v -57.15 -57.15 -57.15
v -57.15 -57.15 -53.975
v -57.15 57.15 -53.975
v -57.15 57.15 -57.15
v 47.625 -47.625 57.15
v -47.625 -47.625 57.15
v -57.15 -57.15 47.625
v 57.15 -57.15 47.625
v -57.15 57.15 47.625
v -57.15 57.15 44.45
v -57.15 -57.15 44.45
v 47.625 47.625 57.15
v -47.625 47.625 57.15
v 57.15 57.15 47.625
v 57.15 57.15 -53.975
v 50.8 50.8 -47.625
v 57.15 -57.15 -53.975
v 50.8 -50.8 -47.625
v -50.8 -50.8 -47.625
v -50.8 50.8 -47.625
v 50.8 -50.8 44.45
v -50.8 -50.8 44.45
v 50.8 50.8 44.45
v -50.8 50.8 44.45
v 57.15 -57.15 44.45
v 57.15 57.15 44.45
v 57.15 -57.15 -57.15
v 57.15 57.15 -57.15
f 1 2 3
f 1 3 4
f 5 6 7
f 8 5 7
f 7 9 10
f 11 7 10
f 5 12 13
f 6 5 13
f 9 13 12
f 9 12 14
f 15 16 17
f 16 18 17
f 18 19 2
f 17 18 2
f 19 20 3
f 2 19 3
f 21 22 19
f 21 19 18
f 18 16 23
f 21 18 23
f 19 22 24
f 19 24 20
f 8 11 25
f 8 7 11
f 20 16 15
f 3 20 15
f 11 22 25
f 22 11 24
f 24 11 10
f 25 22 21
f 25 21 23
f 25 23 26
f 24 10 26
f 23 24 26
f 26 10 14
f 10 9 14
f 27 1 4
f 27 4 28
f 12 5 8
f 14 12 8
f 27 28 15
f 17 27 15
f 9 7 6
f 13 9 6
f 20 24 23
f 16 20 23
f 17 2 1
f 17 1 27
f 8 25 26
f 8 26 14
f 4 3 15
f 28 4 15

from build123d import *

# Parameters (mm, degrees)
F0_W          = 101.6
F0_H          = 6.35
F0_H_2        = 88.9
F1_DEPTH      = 50.8
F2_DEPTH      = 57.15
F3_DEPTH      = 57.15
F4_T1_DEPTH   = 163.2905609208
F4_T3_DEPTH   = 163.2905609208
F4_T8_DEPTH   = 163.2905609208
F4_T14_DEPTH  = 163.2905609208
F4_T20_DEPTH  = 163.2905609208
F4_T27_DEPTH  = 163.2905609208
F4_T33_DEPTH  = 163.2905609208
F4_T39_DEPTH  = 163.2905609208
F4_T45_DEPTH  = 163.2905609208
F4_T51_DEPTH  = 163.2905609208
F4_T58_DEPTH  = 163.2905609208
F4_T64_DEPTH  = 163.2905609208
F4_T70_DEPTH  = 163.2905609208
F4_T76_DEPTH  = 163.2905609208
F4_T82_DEPTH  = 163.2905609208
F4_T89_DEPTH  = 163.2905609208
F4_T95_DEPTH  = 163.2905609208
F4_T101_DEPTH = 163.2905609208
F4_T107_DEPTH = 163.2905609208
F4_T113_DEPTH = 163.2905609208
F4_T120_DEPTH = 163.2905609208
F4_T126_DEPTH = 163.2905609208


# Not quite as in the source:
# - a fillet or chamfer that OpenCascade refuses, or shapes differently, is made with other operations: its cross-section is extruded or revolved along the edge and cut away or added


with BuildPart() as f1:
    # F0 (on Front) → F1 (new body, symmetric)
    with BuildSketch(Plane.XZ):
        with Locations((0, -47.625)):
            Rectangle(F0_W, F0_H)
        Rectangle(F0_W, F0_H_2)
        with Locations((0, 47.625)):
            Rectangle(F0_W, F0_H)
    extrude(amount=F1_DEPTH, both=True)

    # F0 (on Front) → F2 (join, symmetric)
    with BuildSketch(Plane.XZ):
        Polygon((-50.8, 44.45), (-50.8, 50.8), (50.8, 50.8), (50.8, 44.45), (57.15, 44.45), (57.15, 57.15), (-57.15, 57.15), (-57.15, 44.45), align=None)
        Polygon((-50.8, -50.8), (-50.8, -44.45), (-57.15, -44.45), (-57.15, -57.15), (57.15, -57.15), (57.15, -44.45), (50.8, -44.45), (50.8, -50.8), align=None)
    extrude(amount=F2_DEPTH, both=True)

    # F0 (on Front) → F3 (join, symmetric)
    with BuildSketch(Plane.XZ):
        with Locations((0, 47.625)):
            Rectangle(F0_W, F0_H)
        with Locations((0, -47.625)):
            Rectangle(F0_W, F0_H)
    extrude(amount=F3_DEPTH, both=True)

    # F4: chamfer of 9.525 on 8 edges, made by hand

    # F4_s2 → F4_t1 (cut)
    with BuildSketch(Plane.YZ.offset(-81.6452804604)):
        Polygon((-47.625, 57.15), (-57.15, 47.625), (-57.15, 57.15), align=None)
        Polygon((47.625, 57.15), (57.15, 47.625), (57.15, 57.15), align=None)
    extrude(amount=F4_T1_DEPTH, mode=Mode.SUBTRACT)

    # F4_s4 → F4_t3 (cut)
    with BuildSketch(Plane.XZ.offset(-81.6452804604)):
        Polygon((47.625, 57.15), (57.15, 47.625), (57.15, 57.15), align=None)
        Polygon((-57.15, 47.625), (-47.625, 57.15), (-57.15, 57.15), align=None)
    extrude(amount=F4_T3_DEPTH, mode=Mode.SUBTRACT)


with BuildPart() as f4_tool6:
    # F4_s7 → F4_t8 (new body)
    with BuildSketch(Plane.XZ.offset(81.6452804604)):
        Polygon((47.625, -44.45), (57.15, -53.975), (57.15, -44.45), align=None)
    extrude(amount=-F4_T8_DEPTH)

    split(bisect_by=Plane.YZ.offset(50.8), keep=Keep.BOTTOM)

    split(bisect_by=Plane.XZ.offset(50.8), keep=Keep.TOP)


with BuildPart() as f1_1:
    add(f1.part)

    # F4_t5: cut F4_tool6
    add(f4_tool6.part, mode=Mode.SUBTRACT)


with BuildPart() as f4_tool12:
    # F4_s13 → F4_t14 (new body)
    with BuildSketch(Plane.XZ.offset(81.6452804604)):
        Polygon((47.625, -44.45), (57.15, -53.975), (57.15, -44.45), align=None)
    extrude(amount=-F4_T14_DEPTH)

    split(bisect_by=Plane.YZ.offset(50.8), keep=Keep.TOP)

    split(bisect_by=Plane.XZ.offset(50.8), keep=Keep.TOP)


with BuildPart() as f1_2:
    add(f1_1.part)

    # F4_t11: cut F4_tool12
    add(f4_tool12.part, mode=Mode.SUBTRACT)


with BuildPart() as f4_tool18:
    # F4_s19 → F4_t20 (new body)
    with BuildSketch(Plane.XZ.offset(81.6452804604)):
        Polygon((47.625, -44.45), (57.15, -53.975), (57.15, -44.45), align=None)
    extrude(amount=-F4_T20_DEPTH)

    split(bisect_by=Plane.XZ.offset(-50.8), keep=Keep.TOP)

    split(bisect_by=Plane.YZ.offset(50.8), keep=Keep.TOP)

    split(bisect_by=Plane.XZ.offset(50.8), keep=Keep.BOTTOM)


with BuildPart() as f1_3:
    add(f1_2.part)

    # F4_t17: cut F4_tool18
    add(f4_tool18.part, mode=Mode.SUBTRACT)


with BuildPart() as f4_tool25:
    # F4_s26 → F4_t27 (new body)
    with BuildSketch(Plane.XZ.offset(81.6452804604)):
        Polygon((47.625, -44.45), (57.15, -53.975), (57.15, -44.45), align=None)
    extrude(amount=-F4_T27_DEPTH)

    split(bisect_by=Plane.XZ.offset(-50.8), keep=Keep.BOTTOM)

    split(bisect_by=Plane.YZ.offset(50.8), keep=Keep.BOTTOM)


with BuildPart() as f1_4:
    add(f1_3.part)

    # F4_t24: cut F4_tool25
    add(f4_tool25.part, mode=Mode.SUBTRACT)


with BuildPart() as f4_tool31:
    # F4_s32 → F4_t33 (new body)
    with BuildSketch(Plane.XZ.offset(81.6452804604)):
        Polygon((47.625, -44.45), (57.15, -53.975), (57.15, -44.45), align=None)
    extrude(amount=-F4_T33_DEPTH)

    split(bisect_by=Plane.XZ.offset(-50.8), keep=Keep.BOTTOM)

    split(bisect_by=Plane.YZ.offset(50.8), keep=Keep.TOP)


with BuildPart() as f1_5:
    add(f1_4.part)

    # F4_t30: cut F4_tool31
    add(f4_tool31.part, mode=Mode.SUBTRACT)


with BuildPart() as f4_tool37:
    # F4_s38 → F4_t39 (new body)
    with BuildSketch(Plane.YZ.offset(-81.6452804604)):
        Polygon((-47.625, -44.45), (-57.15, -53.975), (-57.15, -44.45), align=None)
    extrude(amount=F4_T39_DEPTH)

    split(bisect_by=Plane.YZ.offset(-50.8), keep=Keep.BOTTOM)

    split(bisect_by=Plane.XZ.offset(50.8), keep=Keep.BOTTOM)


with BuildPart() as f1_6:
    add(f1_5.part)

    # F4_t36: cut F4_tool37
    add(f4_tool37.part, mode=Mode.SUBTRACT)


with BuildPart() as f4_tool43:
    # F4_s44 → F4_t45 (new body)
    with BuildSketch(Plane.YZ.offset(-81.6452804604)):
        Polygon((-47.625, -44.45), (-57.15, -53.975), (-57.15, -44.45), align=None)
    extrude(amount=F4_T45_DEPTH)

    split(bisect_by=Plane.YZ.offset(-50.8), keep=Keep.BOTTOM)

    split(bisect_by=Plane.XZ.offset(50.8), keep=Keep.TOP)


with BuildPart() as f1_7:
    add(f1_6.part)

    # F4_t42: cut F4_tool43
    add(f4_tool43.part, mode=Mode.SUBTRACT)


with BuildPart() as f4_tool49:
    # F4_s50 → F4_t51 (new body)
    with BuildSketch(Plane.YZ.offset(-81.6452804604)):
        Polygon((-47.625, -44.45), (-57.15, -53.975), (-57.15, -44.45), align=None)
    extrude(amount=F4_T51_DEPTH)

    split(bisect_by=Plane.YZ.offset(-50.8), keep=Keep.TOP)

    split(bisect_by=Plane.YZ.offset(50.8), keep=Keep.BOTTOM)

    split(bisect_by=Plane.XZ.offset(50.8), keep=Keep.TOP)


with BuildPart() as f1_8:
    add(f1_7.part)

    # F4_t48: cut F4_tool49
    add(f4_tool49.part, mode=Mode.SUBTRACT)


with BuildPart() as f4_tool56:
    # F4_s57 → F4_t58 (new body)
    with BuildSketch(Plane.YZ.offset(-81.6452804604)):
        Polygon((-47.625, -44.45), (-57.15, -53.975), (-57.15, -44.45), align=None)
    extrude(amount=F4_T58_DEPTH)

    split(bisect_by=Plane.YZ.offset(50.8), keep=Keep.TOP)

    split(bisect_by=Plane.XZ.offset(50.8), keep=Keep.BOTTOM)


with BuildPart() as f1_9:
    add(f1_8.part)

    # F4_t55: cut F4_tool56
    add(f4_tool56.part, mode=Mode.SUBTRACT)


with BuildPart() as f4_tool62:
    # F4_s63 → F4_t64 (new body)
    with BuildSketch(Plane.YZ.offset(-81.6452804604)):
        Polygon((-47.625, -44.45), (-57.15, -53.975), (-57.15, -44.45), align=None)
    extrude(amount=F4_T64_DEPTH)

    split(bisect_by=Plane.YZ.offset(50.8), keep=Keep.TOP)

    split(bisect_by=Plane.XZ.offset(50.8), keep=Keep.TOP)


with BuildPart() as f1_10:
    add(f1_9.part)

    # F4_t61: cut F4_tool62
    add(f4_tool62.part, mode=Mode.SUBTRACT)


with BuildPart() as f4_tool68:
    # F4_s69 → F4_t70 (new body)
    with BuildSketch(Plane.XZ.offset(-81.6452804604)):
        Polygon((-47.625, -44.45), (-57.15, -53.975), (-57.15, -44.45), align=None)
    extrude(amount=F4_T70_DEPTH)

    split(bisect_by=Plane.YZ.offset(-50.8), keep=Keep.TOP)

    split(bisect_by=Plane.XZ.offset(-50.8), keep=Keep.BOTTOM)


with BuildPart() as f1_11:
    add(f1_10.part)

    # F4_t67: cut F4_tool68
    add(f4_tool68.part, mode=Mode.SUBTRACT)


with BuildPart() as f4_tool74:
    # F4_s75 → F4_t76 (new body)
    with BuildSketch(Plane.XZ.offset(-81.6452804604)):
        Polygon((-47.625, -44.45), (-57.15, -53.975), (-57.15, -44.45), align=None)
    extrude(amount=F4_T76_DEPTH)

    split(bisect_by=Plane.YZ.offset(-50.8), keep=Keep.BOTTOM)

    split(bisect_by=Plane.XZ.offset(-50.8), keep=Keep.BOTTOM)


with BuildPart() as f1_12:
    add(f1_11.part)

    # F4_t73: cut F4_tool74
    add(f4_tool74.part, mode=Mode.SUBTRACT)


with BuildPart() as f4_tool80:
    # F4_s81 → F4_t82 (new body)
    with BuildSketch(Plane.XZ.offset(-81.6452804604)):
        Polygon((-47.625, -44.45), (-57.15, -53.975), (-57.15, -44.45), align=None)
    extrude(amount=F4_T82_DEPTH)

    split(bisect_by=Plane.YZ.offset(-50.8), keep=Keep.BOTTOM)

    split(bisect_by=Plane.XZ.offset(-50.8), keep=Keep.TOP)

    split(bisect_by=Plane.XZ.offset(50.8), keep=Keep.BOTTOM)


with BuildPart() as f1_13:
    add(f1_12.part)

    # F4_t79: cut F4_tool80
    add(f4_tool80.part, mode=Mode.SUBTRACT)


with BuildPart() as f4_tool87:
    # F4_s88 → F4_t89 (new body)
    with BuildSketch(Plane.XZ.offset(-81.6452804604)):
        Polygon((-47.625, -44.45), (-57.15, -53.975), (-57.15, -44.45), align=None)
    extrude(amount=F4_T89_DEPTH)

    split(bisect_by=Plane.YZ.offset(-50.8), keep=Keep.TOP)

    split(bisect_by=Plane.XZ.offset(50.8), keep=Keep.TOP)


with BuildPart() as f1_14:
    add(f1_13.part)

    # F4_t86: cut F4_tool87
    add(f4_tool87.part, mode=Mode.SUBTRACT)


with BuildPart() as f4_tool93:
    # F4_s94 → F4_t95 (new body)
    with BuildSketch(Plane.XZ.offset(-81.6452804604)):
        Polygon((-47.625, -44.45), (-57.15, -53.975), (-57.15, -44.45), align=None)
    extrude(amount=F4_T95_DEPTH)

    split(bisect_by=Plane.YZ.offset(-50.8), keep=Keep.BOTTOM)

    split(bisect_by=Plane.XZ.offset(50.8), keep=Keep.TOP)


with BuildPart() as f1_15:
    add(f1_14.part)

    # F4_t92: cut F4_tool93
    add(f4_tool93.part, mode=Mode.SUBTRACT)


with BuildPart() as f4_tool99:
    # F4_s100 → F4_t101 (new body)
    with BuildSketch(Plane.YZ.offset(81.6452804604)):
        Polygon((47.625, -44.45), (57.15, -53.975), (57.15, -44.45), align=None)
    extrude(amount=-F4_T101_DEPTH)

    split(bisect_by=Plane.XZ.offset(-50.8), keep=Keep.TOP)

    split(bisect_by=Plane.YZ.offset(50.8), keep=Keep.TOP)


with BuildPart() as f1_16:
    add(f1_15.part)

    # F4_t98: cut F4_tool99
    add(f4_tool99.part, mode=Mode.SUBTRACT)


with BuildPart() as f4_tool105:
    # F4_s106 → F4_t107 (new body)
    with BuildSketch(Plane.YZ.offset(81.6452804604)):
        Polygon((47.625, -44.45), (57.15, -53.975), (57.15, -44.45), align=None)
    extrude(amount=-F4_T107_DEPTH)

    split(bisect_by=Plane.XZ.offset(-50.8), keep=Keep.BOTTOM)

    split(bisect_by=Plane.YZ.offset(50.8), keep=Keep.TOP)


with BuildPart() as f1_17:
    add(f1_16.part)

    # F4_t104: cut F4_tool105
    add(f4_tool105.part, mode=Mode.SUBTRACT)


with BuildPart() as f4_tool111:
    # F4_s112 → F4_t113 (new body)
    with BuildSketch(Plane.YZ.offset(81.6452804604)):
        Polygon((47.625, -44.45), (57.15, -53.975), (57.15, -44.45), align=None)
    extrude(amount=-F4_T113_DEPTH)

    split(bisect_by=Plane.YZ.offset(-50.8), keep=Keep.TOP)

    split(bisect_by=Plane.XZ.offset(-50.8), keep=Keep.BOTTOM)

    split(bisect_by=Plane.YZ.offset(50.8), keep=Keep.BOTTOM)


with BuildPart() as f1_18:
    add(f1_17.part)

    # F4_t110: cut F4_tool111
    add(f4_tool111.part, mode=Mode.SUBTRACT)


with BuildPart() as f4_tool118:
    # F4_s119 → F4_t120 (new body)
    with BuildSketch(Plane.YZ.offset(81.6452804604)):
        Polygon((47.625, -44.45), (57.15, -53.975), (57.15, -44.45), align=None)
    extrude(amount=-F4_T120_DEPTH)

    split(bisect_by=Plane.YZ.offset(-50.8), keep=Keep.BOTTOM)

    split(bisect_by=Plane.XZ.offset(-50.8), keep=Keep.TOP)


with BuildPart() as f1_19:
    add(f1_18.part)

    # F4_t117: cut F4_tool118
    add(f4_tool118.part, mode=Mode.SUBTRACT)


with BuildPart() as f4_tool124:
    # F4_s125 → F4_t126 (new body)
    with BuildSketch(Plane.YZ.offset(81.6452804604)):
        Polygon((47.625, -44.45), (57.15, -53.975), (57.15, -44.45), align=None)
    extrude(amount=-F4_T126_DEPTH)

    split(bisect_by=Plane.YZ.offset(-50.8), keep=Keep.BOTTOM)

    split(bisect_by=Plane.XZ.offset(-50.8), keep=Keep.BOTTOM)


with BuildPart() as f1_20:
    add(f1_19.part)

    # F4_t123: cut F4_tool124
    add(f4_tool124.part, mode=Mode.SUBTRACT)


solid = f1_20.part
